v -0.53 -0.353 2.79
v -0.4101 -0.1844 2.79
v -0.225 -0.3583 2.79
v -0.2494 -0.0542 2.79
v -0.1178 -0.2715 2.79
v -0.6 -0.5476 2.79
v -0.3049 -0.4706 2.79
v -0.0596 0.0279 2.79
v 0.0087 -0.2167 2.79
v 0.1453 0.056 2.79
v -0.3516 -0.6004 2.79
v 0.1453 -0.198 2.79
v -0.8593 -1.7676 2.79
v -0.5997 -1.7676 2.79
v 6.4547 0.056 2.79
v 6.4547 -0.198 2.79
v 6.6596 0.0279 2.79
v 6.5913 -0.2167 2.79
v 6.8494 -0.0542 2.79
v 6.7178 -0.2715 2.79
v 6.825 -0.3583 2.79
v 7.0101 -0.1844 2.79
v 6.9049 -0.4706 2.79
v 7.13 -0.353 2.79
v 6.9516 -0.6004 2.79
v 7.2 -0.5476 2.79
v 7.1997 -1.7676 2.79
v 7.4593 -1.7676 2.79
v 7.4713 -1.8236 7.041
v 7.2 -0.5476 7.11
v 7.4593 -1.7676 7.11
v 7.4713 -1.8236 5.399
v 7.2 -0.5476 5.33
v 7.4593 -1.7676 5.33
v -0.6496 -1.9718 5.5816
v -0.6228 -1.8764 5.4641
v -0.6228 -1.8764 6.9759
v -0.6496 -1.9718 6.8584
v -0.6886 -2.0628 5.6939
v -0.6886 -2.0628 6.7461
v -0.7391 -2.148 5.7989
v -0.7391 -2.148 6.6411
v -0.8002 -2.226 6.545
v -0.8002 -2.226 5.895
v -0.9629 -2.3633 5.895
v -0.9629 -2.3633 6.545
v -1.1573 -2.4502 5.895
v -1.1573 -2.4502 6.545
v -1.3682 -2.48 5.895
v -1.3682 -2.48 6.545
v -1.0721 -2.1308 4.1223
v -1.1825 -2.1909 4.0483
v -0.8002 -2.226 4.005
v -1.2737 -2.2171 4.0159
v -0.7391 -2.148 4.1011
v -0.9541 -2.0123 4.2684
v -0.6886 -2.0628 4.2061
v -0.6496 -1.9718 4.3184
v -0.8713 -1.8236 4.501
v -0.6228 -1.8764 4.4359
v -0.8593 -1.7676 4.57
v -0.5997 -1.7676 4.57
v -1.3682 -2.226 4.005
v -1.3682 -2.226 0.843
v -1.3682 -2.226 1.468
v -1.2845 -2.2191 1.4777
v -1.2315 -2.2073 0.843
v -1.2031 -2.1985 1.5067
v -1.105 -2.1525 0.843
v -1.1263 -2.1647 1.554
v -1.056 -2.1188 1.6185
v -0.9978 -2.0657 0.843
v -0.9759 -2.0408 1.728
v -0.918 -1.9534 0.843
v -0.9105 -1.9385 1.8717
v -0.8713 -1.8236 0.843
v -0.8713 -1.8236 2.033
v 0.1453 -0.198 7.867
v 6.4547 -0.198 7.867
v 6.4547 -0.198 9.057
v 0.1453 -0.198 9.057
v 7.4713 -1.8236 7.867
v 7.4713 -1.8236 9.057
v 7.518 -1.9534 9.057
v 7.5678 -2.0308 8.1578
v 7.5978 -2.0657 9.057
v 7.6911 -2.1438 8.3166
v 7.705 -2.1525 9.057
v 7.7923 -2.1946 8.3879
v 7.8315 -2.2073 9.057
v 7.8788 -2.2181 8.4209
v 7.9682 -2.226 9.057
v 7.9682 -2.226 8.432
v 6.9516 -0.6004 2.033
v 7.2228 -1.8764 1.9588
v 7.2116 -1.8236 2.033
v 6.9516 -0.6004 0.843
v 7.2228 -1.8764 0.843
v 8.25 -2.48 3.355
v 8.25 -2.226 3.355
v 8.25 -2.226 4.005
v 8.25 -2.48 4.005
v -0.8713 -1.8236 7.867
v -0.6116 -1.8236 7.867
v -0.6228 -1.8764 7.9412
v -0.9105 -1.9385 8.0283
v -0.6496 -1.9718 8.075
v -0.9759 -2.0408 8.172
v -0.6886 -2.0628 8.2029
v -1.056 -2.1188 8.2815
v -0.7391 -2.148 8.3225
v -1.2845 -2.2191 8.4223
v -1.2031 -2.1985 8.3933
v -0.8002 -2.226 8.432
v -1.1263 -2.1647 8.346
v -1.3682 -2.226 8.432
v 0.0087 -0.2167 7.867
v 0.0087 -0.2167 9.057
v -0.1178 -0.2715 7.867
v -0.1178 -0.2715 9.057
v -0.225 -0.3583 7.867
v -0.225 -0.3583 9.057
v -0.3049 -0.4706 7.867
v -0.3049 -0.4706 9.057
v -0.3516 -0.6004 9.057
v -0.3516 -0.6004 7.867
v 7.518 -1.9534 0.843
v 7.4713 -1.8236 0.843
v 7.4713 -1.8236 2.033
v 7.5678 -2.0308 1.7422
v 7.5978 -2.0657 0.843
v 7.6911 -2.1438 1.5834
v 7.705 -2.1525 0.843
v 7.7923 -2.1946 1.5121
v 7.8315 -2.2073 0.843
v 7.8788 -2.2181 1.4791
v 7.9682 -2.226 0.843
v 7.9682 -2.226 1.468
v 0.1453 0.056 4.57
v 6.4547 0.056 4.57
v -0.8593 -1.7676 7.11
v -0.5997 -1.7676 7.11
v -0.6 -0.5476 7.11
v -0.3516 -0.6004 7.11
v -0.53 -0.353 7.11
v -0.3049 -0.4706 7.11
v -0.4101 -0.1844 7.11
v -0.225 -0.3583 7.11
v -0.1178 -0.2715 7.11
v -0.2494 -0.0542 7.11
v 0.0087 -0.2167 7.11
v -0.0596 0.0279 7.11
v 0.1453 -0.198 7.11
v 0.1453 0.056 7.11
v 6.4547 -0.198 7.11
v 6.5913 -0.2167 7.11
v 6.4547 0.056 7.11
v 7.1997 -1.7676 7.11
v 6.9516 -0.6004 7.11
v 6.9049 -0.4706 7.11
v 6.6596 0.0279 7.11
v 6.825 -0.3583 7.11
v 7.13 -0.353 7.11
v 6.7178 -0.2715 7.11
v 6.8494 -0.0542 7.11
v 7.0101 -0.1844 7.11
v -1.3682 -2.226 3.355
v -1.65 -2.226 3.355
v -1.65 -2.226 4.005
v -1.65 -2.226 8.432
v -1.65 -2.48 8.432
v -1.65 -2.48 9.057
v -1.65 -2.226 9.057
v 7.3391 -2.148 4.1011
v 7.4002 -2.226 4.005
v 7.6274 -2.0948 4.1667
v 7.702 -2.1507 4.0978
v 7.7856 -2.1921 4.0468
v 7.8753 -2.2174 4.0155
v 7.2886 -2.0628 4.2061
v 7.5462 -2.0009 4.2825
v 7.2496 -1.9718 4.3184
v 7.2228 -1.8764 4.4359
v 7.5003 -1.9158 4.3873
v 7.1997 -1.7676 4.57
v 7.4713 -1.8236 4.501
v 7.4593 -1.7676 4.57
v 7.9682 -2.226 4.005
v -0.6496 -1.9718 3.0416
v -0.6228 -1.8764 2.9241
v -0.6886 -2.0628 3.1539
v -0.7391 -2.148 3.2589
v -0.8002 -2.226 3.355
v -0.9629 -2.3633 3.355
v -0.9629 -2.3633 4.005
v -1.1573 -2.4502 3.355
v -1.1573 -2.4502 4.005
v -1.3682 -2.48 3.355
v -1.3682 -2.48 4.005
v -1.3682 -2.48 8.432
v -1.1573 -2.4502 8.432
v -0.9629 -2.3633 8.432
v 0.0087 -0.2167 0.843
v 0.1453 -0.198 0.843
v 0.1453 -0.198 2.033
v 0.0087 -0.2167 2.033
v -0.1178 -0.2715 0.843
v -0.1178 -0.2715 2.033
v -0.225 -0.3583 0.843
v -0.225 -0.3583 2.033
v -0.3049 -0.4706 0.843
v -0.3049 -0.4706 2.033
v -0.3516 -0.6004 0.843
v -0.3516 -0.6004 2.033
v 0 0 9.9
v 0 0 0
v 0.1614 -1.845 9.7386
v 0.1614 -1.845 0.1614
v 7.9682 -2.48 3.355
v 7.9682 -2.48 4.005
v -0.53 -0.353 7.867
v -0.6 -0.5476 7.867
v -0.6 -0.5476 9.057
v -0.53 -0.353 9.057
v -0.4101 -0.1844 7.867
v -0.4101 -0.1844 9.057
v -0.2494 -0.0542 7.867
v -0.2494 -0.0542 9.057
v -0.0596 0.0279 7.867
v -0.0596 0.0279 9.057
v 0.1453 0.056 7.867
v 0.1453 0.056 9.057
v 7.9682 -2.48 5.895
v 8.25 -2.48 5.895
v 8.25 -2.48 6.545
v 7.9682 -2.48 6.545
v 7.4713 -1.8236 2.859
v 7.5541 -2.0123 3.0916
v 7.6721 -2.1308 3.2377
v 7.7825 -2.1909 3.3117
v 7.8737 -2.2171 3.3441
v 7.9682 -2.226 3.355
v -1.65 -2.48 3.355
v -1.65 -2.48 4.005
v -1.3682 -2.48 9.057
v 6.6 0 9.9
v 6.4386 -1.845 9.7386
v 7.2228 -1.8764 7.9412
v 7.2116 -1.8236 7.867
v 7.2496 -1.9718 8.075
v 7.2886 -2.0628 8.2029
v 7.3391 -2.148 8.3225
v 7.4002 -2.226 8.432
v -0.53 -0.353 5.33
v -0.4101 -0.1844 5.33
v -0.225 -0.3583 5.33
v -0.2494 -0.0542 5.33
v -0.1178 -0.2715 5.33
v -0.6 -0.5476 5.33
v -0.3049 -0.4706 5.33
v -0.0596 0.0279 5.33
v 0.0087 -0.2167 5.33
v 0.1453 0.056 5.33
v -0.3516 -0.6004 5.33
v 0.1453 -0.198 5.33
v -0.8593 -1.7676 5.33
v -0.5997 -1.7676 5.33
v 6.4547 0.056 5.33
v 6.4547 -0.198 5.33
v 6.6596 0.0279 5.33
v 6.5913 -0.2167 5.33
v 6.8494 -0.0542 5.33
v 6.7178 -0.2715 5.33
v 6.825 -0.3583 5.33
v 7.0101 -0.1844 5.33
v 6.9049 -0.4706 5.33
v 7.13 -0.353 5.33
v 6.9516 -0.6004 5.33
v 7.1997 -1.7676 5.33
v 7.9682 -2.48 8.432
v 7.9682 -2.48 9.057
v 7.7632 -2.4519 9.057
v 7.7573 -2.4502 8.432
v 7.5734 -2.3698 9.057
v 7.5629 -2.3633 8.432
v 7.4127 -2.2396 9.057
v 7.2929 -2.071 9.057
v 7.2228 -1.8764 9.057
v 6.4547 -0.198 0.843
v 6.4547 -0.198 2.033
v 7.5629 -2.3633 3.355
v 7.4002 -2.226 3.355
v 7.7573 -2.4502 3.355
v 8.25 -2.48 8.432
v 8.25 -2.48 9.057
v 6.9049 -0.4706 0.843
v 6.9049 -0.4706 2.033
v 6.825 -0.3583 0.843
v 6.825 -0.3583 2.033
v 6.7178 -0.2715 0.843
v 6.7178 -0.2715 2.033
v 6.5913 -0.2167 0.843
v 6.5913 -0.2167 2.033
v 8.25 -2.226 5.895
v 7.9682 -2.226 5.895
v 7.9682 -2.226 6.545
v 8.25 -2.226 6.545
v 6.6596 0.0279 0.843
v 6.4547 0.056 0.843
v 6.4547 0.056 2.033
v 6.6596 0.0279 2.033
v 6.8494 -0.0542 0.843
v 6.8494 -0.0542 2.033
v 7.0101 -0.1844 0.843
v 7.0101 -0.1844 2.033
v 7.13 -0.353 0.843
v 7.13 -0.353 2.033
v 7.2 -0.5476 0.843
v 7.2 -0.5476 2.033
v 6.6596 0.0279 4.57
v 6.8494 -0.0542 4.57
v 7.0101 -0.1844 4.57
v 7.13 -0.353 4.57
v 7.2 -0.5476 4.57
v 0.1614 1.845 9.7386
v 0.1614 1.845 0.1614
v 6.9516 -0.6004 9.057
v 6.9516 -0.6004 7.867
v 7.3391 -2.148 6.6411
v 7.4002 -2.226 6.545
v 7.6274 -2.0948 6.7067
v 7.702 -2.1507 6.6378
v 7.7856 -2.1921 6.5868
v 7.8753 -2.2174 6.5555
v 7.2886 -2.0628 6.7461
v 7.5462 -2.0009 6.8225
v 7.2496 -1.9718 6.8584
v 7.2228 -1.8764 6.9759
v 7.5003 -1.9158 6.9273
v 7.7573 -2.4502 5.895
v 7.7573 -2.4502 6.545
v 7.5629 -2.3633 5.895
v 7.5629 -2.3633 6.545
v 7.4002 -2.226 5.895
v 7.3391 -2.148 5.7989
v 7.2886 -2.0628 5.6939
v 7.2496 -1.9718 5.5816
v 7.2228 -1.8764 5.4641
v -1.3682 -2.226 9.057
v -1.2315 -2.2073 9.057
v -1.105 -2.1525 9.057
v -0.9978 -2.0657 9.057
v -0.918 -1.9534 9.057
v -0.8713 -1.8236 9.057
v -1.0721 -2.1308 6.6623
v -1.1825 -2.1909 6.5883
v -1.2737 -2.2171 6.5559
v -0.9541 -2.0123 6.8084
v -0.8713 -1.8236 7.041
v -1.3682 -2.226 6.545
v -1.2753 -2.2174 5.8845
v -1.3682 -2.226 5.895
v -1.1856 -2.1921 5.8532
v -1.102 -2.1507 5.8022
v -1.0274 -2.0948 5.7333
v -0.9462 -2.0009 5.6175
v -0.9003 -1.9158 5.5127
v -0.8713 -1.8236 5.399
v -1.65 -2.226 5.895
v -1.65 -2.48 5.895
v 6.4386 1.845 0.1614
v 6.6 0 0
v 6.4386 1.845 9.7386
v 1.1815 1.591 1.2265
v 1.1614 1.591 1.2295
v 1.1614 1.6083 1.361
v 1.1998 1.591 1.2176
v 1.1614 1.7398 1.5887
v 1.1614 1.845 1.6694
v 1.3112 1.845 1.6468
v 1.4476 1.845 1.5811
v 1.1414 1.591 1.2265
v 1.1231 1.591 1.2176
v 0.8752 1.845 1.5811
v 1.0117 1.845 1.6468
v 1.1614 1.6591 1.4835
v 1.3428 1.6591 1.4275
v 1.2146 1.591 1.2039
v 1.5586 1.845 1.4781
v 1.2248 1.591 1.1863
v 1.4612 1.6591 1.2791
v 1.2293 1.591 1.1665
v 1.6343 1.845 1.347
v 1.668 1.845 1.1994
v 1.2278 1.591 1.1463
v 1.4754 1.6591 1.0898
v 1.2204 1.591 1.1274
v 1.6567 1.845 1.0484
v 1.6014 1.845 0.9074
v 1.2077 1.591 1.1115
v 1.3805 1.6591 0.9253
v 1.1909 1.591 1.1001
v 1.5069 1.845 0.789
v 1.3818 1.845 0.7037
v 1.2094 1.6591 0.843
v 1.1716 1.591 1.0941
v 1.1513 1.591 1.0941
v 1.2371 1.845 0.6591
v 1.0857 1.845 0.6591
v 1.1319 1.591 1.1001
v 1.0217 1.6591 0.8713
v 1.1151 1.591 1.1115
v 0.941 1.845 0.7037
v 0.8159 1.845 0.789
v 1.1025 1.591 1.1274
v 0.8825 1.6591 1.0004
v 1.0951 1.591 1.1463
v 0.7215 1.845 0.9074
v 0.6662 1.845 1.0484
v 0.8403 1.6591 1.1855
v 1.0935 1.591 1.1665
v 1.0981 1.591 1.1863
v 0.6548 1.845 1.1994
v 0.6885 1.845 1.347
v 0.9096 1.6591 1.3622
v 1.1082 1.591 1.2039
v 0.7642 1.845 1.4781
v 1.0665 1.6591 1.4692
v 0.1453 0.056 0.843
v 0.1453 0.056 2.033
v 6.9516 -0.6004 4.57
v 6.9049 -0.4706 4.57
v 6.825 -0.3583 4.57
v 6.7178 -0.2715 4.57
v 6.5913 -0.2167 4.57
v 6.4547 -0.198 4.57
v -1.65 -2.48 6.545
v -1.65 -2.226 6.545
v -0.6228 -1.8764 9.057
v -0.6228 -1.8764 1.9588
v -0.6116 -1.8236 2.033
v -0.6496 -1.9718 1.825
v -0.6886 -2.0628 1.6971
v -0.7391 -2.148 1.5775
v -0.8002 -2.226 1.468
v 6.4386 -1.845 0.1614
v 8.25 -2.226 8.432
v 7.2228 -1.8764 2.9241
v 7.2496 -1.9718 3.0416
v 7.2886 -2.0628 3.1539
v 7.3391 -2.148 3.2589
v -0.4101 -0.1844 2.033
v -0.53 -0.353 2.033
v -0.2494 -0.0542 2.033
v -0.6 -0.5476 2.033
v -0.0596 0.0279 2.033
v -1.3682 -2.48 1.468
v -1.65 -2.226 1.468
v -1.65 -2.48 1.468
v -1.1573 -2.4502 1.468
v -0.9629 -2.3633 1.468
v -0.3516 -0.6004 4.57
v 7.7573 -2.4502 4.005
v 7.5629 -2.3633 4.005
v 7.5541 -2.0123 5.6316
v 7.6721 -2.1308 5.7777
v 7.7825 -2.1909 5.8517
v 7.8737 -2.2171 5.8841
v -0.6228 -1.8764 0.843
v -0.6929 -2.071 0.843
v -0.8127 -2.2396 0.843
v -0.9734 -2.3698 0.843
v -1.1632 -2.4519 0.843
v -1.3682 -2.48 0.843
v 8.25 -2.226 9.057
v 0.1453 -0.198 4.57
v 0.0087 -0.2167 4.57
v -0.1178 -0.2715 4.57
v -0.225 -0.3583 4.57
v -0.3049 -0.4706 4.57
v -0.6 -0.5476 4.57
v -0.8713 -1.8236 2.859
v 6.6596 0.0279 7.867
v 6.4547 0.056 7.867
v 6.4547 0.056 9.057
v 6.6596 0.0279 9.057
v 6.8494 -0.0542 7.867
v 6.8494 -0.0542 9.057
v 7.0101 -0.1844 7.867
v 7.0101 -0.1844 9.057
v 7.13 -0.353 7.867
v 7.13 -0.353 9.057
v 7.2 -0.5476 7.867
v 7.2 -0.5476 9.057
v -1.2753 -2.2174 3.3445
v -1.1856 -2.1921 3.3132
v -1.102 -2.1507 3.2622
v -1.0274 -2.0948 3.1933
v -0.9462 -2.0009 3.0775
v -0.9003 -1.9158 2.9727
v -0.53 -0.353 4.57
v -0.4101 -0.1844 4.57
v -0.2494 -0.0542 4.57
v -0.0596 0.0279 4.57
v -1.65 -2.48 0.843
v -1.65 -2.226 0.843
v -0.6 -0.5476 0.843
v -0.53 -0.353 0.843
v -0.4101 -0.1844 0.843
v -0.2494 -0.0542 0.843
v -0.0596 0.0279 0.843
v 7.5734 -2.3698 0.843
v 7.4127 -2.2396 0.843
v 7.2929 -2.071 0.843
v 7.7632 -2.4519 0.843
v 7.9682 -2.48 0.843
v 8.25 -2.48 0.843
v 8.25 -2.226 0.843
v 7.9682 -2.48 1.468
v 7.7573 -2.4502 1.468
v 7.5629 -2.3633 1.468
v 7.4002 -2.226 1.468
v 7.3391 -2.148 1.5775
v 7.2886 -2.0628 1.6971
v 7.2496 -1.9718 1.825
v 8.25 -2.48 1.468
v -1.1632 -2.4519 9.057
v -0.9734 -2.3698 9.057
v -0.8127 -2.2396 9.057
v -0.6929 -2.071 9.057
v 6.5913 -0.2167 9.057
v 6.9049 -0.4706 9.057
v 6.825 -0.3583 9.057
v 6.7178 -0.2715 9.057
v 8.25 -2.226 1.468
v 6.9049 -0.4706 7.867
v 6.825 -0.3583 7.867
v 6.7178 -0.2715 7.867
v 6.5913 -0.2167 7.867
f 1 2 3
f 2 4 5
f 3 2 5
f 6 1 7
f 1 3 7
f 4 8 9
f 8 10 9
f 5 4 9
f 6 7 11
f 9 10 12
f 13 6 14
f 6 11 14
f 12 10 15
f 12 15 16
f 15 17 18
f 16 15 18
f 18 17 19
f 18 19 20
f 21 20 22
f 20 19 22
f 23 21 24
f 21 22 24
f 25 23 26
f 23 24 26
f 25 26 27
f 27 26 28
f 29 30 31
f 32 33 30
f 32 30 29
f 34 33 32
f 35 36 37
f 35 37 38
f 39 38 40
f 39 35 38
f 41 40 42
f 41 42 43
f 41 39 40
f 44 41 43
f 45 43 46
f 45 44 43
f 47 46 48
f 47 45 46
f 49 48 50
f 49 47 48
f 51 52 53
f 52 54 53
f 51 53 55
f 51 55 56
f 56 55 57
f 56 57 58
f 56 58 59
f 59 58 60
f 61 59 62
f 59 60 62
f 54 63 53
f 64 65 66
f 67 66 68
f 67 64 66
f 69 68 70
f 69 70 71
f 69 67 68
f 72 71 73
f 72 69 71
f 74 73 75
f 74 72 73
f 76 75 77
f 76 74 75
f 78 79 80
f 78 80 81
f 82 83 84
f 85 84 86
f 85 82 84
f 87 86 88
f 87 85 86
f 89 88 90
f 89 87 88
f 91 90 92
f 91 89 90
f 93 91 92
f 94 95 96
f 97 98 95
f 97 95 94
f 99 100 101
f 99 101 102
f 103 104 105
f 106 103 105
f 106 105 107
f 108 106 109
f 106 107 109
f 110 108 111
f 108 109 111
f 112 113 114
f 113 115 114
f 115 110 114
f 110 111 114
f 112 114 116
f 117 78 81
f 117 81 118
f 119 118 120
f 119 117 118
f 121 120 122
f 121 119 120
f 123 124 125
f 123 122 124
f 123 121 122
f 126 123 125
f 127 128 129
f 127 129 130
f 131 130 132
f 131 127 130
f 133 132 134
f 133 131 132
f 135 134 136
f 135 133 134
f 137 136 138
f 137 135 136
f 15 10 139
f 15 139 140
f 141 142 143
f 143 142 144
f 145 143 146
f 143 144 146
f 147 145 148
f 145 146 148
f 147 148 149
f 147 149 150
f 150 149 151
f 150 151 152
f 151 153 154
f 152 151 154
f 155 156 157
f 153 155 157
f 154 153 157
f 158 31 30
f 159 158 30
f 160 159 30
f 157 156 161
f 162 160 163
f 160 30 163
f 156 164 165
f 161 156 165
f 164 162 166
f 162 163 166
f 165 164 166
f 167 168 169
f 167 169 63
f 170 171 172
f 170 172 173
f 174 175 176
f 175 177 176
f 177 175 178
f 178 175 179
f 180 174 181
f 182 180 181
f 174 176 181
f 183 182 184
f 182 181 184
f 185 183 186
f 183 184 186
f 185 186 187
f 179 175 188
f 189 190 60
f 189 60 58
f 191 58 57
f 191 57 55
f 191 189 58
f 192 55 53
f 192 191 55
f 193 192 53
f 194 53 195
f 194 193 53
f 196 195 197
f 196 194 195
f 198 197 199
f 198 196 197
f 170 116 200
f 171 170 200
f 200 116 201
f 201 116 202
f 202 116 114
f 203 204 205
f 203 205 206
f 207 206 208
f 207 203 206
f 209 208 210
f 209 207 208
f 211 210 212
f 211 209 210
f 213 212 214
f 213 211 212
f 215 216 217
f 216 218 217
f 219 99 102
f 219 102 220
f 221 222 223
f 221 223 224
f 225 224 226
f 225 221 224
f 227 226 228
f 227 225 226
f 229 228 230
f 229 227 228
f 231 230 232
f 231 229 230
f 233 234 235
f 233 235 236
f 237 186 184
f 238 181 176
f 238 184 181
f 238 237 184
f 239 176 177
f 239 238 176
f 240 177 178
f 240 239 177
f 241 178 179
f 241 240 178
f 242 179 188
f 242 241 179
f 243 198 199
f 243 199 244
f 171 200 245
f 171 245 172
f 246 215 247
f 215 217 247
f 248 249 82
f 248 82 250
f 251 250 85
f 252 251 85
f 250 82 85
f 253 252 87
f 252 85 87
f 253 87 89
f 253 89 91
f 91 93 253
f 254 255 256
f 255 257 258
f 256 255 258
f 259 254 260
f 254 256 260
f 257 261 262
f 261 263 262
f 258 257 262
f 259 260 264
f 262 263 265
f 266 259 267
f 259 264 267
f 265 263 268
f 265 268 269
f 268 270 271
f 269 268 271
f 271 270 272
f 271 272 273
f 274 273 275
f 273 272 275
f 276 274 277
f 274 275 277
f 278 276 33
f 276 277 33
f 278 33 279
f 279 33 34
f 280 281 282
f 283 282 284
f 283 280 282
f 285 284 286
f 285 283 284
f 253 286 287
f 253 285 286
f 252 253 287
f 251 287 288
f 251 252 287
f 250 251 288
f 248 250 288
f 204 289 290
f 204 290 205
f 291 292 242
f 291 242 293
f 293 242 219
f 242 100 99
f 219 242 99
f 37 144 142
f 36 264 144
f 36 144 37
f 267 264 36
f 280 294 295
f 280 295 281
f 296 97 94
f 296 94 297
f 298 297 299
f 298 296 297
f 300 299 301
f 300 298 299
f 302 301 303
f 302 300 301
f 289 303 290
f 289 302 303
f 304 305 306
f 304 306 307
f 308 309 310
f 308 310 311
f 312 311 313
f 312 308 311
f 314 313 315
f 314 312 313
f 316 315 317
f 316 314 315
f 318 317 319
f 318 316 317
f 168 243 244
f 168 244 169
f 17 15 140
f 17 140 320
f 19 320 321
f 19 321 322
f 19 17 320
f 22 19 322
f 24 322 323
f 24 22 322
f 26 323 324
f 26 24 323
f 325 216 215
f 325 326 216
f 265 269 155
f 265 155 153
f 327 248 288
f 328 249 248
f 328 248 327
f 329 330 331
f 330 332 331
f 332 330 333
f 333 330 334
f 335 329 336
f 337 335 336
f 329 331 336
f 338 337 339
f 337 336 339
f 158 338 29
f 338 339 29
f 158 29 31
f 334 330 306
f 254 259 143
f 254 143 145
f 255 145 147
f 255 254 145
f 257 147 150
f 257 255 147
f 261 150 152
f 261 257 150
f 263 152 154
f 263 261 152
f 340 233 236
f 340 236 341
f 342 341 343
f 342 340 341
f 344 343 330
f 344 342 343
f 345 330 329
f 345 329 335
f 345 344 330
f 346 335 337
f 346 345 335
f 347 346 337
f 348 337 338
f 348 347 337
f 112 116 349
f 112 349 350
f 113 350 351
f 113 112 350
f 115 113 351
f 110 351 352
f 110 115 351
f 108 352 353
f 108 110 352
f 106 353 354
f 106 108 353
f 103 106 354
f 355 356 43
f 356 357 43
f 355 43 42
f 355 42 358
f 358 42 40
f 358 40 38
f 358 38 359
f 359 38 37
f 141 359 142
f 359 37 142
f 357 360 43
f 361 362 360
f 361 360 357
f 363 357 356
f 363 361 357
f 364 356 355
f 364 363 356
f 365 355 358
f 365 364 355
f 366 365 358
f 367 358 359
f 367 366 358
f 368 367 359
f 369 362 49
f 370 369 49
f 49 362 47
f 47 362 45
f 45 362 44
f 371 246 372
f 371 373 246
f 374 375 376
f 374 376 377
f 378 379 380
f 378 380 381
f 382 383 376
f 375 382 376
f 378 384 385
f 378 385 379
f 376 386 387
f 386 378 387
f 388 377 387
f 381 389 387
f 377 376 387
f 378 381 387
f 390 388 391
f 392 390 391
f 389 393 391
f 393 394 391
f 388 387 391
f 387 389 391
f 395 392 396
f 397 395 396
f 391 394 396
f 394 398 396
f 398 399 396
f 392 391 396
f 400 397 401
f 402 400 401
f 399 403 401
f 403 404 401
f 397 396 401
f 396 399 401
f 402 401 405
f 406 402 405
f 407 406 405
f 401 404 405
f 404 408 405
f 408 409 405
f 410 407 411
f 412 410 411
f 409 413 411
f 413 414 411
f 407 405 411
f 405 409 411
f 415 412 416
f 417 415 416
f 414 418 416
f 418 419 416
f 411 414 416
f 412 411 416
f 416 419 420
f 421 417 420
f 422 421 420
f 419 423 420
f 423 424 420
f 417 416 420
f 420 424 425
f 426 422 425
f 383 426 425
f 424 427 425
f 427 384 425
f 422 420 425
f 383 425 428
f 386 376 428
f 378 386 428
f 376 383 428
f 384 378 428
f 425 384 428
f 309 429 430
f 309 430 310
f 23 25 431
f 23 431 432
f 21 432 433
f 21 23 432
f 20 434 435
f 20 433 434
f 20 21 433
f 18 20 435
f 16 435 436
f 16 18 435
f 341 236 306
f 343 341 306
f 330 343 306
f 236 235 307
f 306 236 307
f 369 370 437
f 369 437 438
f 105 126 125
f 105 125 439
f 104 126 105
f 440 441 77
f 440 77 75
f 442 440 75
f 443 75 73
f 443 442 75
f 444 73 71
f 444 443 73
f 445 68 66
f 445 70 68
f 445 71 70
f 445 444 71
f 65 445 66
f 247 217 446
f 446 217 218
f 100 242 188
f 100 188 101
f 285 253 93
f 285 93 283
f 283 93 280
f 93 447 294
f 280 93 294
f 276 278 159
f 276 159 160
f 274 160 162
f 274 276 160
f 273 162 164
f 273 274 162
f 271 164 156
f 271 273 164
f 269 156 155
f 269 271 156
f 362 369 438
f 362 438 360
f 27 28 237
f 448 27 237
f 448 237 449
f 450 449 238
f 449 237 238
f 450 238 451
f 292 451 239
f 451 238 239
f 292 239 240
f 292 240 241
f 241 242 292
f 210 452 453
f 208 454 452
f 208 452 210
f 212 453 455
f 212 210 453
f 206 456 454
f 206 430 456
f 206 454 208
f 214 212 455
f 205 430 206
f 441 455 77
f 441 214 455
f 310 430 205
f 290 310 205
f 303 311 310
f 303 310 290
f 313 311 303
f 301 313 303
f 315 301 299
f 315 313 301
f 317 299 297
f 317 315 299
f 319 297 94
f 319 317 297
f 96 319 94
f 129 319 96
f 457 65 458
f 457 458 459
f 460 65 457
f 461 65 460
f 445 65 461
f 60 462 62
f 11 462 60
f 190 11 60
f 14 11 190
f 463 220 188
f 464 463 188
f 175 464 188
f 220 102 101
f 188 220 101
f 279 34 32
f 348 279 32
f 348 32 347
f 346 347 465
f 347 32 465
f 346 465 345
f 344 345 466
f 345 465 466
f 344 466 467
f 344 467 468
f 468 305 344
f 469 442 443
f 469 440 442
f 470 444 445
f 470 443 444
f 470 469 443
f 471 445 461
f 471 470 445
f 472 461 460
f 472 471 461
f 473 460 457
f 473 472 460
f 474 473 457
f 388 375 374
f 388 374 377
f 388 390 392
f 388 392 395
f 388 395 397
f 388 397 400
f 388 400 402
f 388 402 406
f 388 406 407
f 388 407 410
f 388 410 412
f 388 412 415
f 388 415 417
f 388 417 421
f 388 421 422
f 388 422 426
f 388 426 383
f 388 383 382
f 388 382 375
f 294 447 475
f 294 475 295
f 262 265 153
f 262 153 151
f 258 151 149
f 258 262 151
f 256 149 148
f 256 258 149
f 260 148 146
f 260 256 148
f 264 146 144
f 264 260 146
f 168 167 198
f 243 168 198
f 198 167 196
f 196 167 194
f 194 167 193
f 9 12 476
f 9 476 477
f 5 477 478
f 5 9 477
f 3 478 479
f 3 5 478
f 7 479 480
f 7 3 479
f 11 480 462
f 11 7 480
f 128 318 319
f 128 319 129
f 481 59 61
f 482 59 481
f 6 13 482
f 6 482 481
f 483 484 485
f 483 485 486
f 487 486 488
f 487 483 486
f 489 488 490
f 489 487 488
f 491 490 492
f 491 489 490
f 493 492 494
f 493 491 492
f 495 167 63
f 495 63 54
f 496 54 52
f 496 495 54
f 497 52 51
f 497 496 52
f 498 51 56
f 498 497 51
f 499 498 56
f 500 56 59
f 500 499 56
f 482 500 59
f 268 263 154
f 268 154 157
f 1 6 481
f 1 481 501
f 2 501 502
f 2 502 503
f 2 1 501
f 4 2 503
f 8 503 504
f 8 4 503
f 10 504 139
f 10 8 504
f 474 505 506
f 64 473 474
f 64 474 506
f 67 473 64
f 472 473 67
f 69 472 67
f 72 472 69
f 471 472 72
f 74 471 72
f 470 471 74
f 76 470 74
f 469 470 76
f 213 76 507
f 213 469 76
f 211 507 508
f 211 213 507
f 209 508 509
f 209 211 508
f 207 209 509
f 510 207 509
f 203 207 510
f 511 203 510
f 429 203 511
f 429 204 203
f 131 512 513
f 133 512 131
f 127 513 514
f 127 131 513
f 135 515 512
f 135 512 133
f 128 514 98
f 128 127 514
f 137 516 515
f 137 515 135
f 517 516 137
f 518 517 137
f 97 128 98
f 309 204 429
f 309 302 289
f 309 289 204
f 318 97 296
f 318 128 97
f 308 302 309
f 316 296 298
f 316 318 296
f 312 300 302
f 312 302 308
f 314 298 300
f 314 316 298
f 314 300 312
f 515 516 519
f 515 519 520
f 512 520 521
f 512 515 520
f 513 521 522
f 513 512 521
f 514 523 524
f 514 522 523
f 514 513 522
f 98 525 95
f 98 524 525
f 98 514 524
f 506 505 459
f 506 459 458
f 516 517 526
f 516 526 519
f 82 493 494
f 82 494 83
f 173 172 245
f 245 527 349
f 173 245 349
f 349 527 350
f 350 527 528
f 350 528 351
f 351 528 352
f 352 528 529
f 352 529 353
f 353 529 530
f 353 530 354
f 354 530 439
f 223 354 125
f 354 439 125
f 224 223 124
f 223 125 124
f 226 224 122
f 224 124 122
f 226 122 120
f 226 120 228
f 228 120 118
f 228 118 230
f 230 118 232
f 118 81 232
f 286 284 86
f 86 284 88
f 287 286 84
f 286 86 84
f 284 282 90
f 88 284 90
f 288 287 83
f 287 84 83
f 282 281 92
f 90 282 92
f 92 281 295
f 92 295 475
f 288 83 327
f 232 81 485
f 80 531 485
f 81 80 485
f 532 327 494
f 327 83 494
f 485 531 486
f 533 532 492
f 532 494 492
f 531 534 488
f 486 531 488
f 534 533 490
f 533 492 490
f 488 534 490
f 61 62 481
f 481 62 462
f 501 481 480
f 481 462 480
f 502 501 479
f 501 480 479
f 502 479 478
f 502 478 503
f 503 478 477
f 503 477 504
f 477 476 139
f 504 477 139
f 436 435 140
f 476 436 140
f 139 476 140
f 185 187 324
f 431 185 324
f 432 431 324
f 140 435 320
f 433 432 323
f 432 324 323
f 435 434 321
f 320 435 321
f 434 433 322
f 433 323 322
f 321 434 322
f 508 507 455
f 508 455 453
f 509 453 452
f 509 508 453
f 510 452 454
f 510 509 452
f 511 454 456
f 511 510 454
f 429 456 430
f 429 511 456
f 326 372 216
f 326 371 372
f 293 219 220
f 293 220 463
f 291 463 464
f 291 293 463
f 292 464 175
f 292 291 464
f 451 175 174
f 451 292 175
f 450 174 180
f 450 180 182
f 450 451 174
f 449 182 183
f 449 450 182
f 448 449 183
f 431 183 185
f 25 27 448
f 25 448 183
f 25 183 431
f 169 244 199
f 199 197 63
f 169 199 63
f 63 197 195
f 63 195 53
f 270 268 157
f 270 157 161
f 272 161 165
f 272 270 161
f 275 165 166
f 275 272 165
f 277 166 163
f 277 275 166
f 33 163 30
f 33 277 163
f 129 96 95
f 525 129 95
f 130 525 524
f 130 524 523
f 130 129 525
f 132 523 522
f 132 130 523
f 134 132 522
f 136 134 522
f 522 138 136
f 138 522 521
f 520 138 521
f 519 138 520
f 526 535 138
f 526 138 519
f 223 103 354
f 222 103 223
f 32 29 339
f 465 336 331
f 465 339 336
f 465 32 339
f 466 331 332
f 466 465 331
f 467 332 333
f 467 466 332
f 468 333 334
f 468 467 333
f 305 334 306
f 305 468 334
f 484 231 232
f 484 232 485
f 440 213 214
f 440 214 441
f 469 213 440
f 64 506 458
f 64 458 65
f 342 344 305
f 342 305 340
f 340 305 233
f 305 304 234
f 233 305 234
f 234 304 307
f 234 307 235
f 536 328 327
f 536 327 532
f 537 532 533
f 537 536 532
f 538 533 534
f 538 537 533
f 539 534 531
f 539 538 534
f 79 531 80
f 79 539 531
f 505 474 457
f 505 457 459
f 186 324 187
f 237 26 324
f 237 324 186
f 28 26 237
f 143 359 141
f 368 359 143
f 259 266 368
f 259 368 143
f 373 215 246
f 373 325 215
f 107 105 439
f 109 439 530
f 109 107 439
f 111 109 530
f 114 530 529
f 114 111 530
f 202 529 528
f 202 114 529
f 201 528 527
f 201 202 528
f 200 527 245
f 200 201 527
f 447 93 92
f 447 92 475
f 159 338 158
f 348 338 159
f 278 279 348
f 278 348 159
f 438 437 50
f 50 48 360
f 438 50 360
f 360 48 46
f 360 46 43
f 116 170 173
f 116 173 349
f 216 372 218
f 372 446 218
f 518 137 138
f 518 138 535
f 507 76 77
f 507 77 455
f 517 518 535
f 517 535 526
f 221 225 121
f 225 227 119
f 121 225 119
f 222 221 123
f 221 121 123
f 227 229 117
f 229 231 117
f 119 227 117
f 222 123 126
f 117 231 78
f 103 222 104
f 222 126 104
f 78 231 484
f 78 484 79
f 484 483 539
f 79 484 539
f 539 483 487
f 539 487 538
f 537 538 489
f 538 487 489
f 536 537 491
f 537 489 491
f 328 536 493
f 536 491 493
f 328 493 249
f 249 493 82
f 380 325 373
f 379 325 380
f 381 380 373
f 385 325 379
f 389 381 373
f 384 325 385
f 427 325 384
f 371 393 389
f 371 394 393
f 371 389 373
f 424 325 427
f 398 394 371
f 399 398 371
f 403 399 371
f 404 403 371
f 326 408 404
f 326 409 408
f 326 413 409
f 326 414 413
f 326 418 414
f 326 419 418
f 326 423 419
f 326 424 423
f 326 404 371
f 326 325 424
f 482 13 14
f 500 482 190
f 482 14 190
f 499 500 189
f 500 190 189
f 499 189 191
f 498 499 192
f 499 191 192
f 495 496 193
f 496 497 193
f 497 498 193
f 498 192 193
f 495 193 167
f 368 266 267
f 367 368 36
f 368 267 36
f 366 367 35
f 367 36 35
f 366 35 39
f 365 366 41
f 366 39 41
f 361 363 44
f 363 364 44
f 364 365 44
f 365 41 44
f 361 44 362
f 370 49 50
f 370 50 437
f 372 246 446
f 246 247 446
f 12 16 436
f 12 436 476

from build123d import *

# Parameters (mm, degrees)
SKETCH1_W                = 6.6
SKETCH1_H                = 9.9
EXTRUDE1_DEPTH           = 1.845
EXTRUDE1_TAPER           = 5
EXTRUDE1_OTHER_WAY_DEPTH = 1.845
EXTRUDE1_OTHER_WAY_TAPER = 5
EXTRUDE2_DEPTH           = 9.9
SKETCH4_W                = 14.472688398
SKETCH4_H                = 13.698747843
CUT_EXTRUDE1_DEPTH       = 15.218663861
SKETCH7_R                = 0.508
CUT_EXTRUDE4_DEPTH       = 0.254
FILLET1_R                = 0.508


with BuildPart() as part:
    # Sketch1 → Extrude1 (new body)
    with BuildSketch(Plane(origin=(0, 0, 0), x_dir=(1, 0, 0), z_dir=(0, 1, 0))):
        with Locations((3.3, -4.95)):
            Rectangle(SKETCH1_W, SKETCH1_H)
    extrude(amount=-EXTRUDE1_DEPTH, taper=EXTRUDE1_TAPER)

    # Sketch1 → Extrude1 other way (add)
    with BuildSketch(Plane(origin=(0, 0, 0), x_dir=(1, 0, 0), z_dir=(0, 1, 0))):
        with Locations((3.3, -4.95)):
            Rectangle(SKETCH1_W, SKETCH1_H)
    extrude(amount=EXTRUDE1_OTHER_WAY_DEPTH, taper=EXTRUDE1_OTHER_WAY_TAPER)

    # Sketch7 → Cut-Extrude4 (cut)
    with BuildSketch(Plane(origin=(0, 1.845, 0), x_dir=(1, 0, 0), z_dir=(0, 1, 0))):
        with Locations(Location((1.161416584, -1.161416584, 0), (0, 0, 270))):
            Circle(SKETCH7_R)
    extrude(amount=-CUT_EXTRUDE4_DEPTH, mode=Mode.SUBTRACT)

    # Fillet1
    # the kernel refuses this fillet: 0.508 mm, written as the material it adds along each edge
    with BuildSketch(Plane(origin=(1.161416584, 1.591, 1.161416584), x_dir=(0, 0, 1), z_dir=(-1, 0, 0))) as fillet1_piece_1:
        with BuildLine():
            CenterArc((0.068059095, 0.508), FILLET1_R, 270, 60)
            Line((0.068059095, 0), (0.068059095, -0.01016))
            Line((0.068059095, -0.01016), (0.508, -0.01016))
            Line((0.508, -0.01016), (0.51816, 0))
            ThreePointArc((0.51816, 0), (0.51816, 0.127), (0.516798818, 0.24892))
            Line((0.516798818, 0.24892), (0.508, 0.254))
        make_face()
    revolve(axis=Axis((1.161416584, 1.591, 1.161416584), (0, 1, 0)))


with BuildPart() as body_2:
    # Sketch2 → Extrude2 (new body)
    with BuildSketch(Plane(origin=(0, -0.430598518, 0), x_dir=(1, 0, 0), z_dir=(0, 0, 1))):
        with BuildLine():
            Line((0.145328065, 0.486598518), (6.454671935, 0.486598518))
            ThreePointArc((6.454671935, 0.486598518), (6.934214073, 0.316783741), (7.200020406, -0.116972773))
            Line((7.200020406, -0.116972773), (7.471252749, -1.393020621))
            ThreePointArc((7.471252749, -1.393020621), (7.648456972, -1.68219163), (7.968151731, -1.795401482))
            Line((7.968151731, -1.795401482), (8.25, -1.795401482))
            Line((8.25, -1.795401482), (8.25, -2.049401482))
            Line((8.25, -2.049401482), (7.968151731, -2.049401482))
            ThreePointArc((7.968151731, -2.049401482), (7.488609593, -1.879586704), (7.222803259, -1.44583019))
            Line((7.222803259, -1.44583019), (6.951570916, -0.169782343))
            ThreePointArc((6.951570916, -0.169782343), (6.774366693, 0.119388667), (6.454671935, 0.232598518))
            Line((6.454671935, 0.232598518), (0.145328065, 0.232598518))
            ThreePointArc((0.145328065, 0.232598518), (-0.174366693, 0.119388667), (-0.351570916, -0.169782343))
            Line((-0.351570916, -0.169782343), (-0.622803259, -1.44583019))
            ThreePointArc((-0.622803259, -1.44583019), (-0.888609593, -1.879586704), (-1.368151731, -2.049401482))
            Line((-1.368151731, -2.049401482), (-1.65, -2.049401482))
            Line((-1.65, -2.049401482), (-1.65, -1.795401482))
            Line((-1.65, -1.795401482), (-1.368151731, -1.795401482))
            ThreePointArc((-1.368151731, -1.795401482), (-1.048456972, -1.68219163), (-0.871252749, -1.393020621))
            Line((-0.871252749, -1.393020621), (-0.600020406, -0.116972773))
            ThreePointArc((-0.600020406, -0.116972773), (-0.334214073, 0.316783741), (0.145328065, 0.486598518))
        make_face()
    extrude(amount=EXTRUDE2_DEPTH)

    # Sketch4 → Cut-Extrude1 (cut, through all)
    with BuildSketch(Plane(origin=(8.25, 0, 0), x_dir=(0, 0, -1), z_dir=(1, 0, 0))):
        with Locations((-5.252892173, -2.360806544)):
            Rectangle(SKETCH4_W, SKETCH4_H)
        Polygon((-7.11, 0.056), (-5.33, 0.056), (-5.33, -1.767619139), (-5.895, -2.226), (-5.895, -2.730319947), (-6.545, -2.730319947), (-6.545, -2.226), (-7.11, -1.767619139), align=None, mode=Mode.SUBTRACT)
        Polygon((-4.005, -2.226), (-4.57, -1.767619139), (-4.57, 0.056), (-2.79, 0.056), (-2.79, -1.767619139), (-3.355, -2.226), (-3.355, -2.730319947), (-4.005, -2.730319947), align=None, mode=Mode.SUBTRACT)
        Polygon((-0.843, -2.730319947), (-0.843, 0.056), (-2.033, 0.056), (-2.033, -1.823619139), (-1.468, -2.226), (-1.468, -2.730319947), align=None, mode=Mode.SUBTRACT)
        Polygon((-9.057, 0.056), (-7.867, 0.056), (-7.867, -1.823619139), (-8.432, -2.226), (-8.432, -2.730319947), (-9.057, -2.730319947), align=None, mode=Mode.SUBTRACT)
    extrude(amount=-CUT_EXTRUDE1_DEPTH, mode=Mode.SUBTRACT)


with BuildPart() as cut_extrude1_piece_1:
    # of the separate pieces the step leaves, piece 1, a body of its own (cut_extrude1_pieces)
    add(body_2.part.solids().sort_by_distance((-1.368151731, -2.226, 5.895))[0])


with BuildPart() as cut_extrude1_piece_2:
    # of the separate pieces the step leaves, piece 2, a body of its own (cut_extrude1_pieces)
    add(body_2.part.solids().sort_by_distance((-1.368151731, -2.226, 3.355))[0])


with BuildPart() as cut_extrude1_piece_3:
    # of the separate pieces the step leaves, piece 3, a body of its own (cut_extrude1_pieces)
    add(body_2.part.solids().sort_by_distance((-1.368151731, -2.226, 0.843))[0])


with BuildPart() as cut_extrude1_piece_4:
    # of the separate pieces the step leaves, piece 4, a body of its own (cut_extrude1_pieces)
    add(body_2.part.solids().sort_by_distance((-1.368151731, -2.226, 8.432))[0])


solid = Compound([part.part, cut_extrude1_piece_1.part, cut_extrude1_piece_2.part, cut_extrude1_piece_3.part, cut_extrude1_piece_4.part])
